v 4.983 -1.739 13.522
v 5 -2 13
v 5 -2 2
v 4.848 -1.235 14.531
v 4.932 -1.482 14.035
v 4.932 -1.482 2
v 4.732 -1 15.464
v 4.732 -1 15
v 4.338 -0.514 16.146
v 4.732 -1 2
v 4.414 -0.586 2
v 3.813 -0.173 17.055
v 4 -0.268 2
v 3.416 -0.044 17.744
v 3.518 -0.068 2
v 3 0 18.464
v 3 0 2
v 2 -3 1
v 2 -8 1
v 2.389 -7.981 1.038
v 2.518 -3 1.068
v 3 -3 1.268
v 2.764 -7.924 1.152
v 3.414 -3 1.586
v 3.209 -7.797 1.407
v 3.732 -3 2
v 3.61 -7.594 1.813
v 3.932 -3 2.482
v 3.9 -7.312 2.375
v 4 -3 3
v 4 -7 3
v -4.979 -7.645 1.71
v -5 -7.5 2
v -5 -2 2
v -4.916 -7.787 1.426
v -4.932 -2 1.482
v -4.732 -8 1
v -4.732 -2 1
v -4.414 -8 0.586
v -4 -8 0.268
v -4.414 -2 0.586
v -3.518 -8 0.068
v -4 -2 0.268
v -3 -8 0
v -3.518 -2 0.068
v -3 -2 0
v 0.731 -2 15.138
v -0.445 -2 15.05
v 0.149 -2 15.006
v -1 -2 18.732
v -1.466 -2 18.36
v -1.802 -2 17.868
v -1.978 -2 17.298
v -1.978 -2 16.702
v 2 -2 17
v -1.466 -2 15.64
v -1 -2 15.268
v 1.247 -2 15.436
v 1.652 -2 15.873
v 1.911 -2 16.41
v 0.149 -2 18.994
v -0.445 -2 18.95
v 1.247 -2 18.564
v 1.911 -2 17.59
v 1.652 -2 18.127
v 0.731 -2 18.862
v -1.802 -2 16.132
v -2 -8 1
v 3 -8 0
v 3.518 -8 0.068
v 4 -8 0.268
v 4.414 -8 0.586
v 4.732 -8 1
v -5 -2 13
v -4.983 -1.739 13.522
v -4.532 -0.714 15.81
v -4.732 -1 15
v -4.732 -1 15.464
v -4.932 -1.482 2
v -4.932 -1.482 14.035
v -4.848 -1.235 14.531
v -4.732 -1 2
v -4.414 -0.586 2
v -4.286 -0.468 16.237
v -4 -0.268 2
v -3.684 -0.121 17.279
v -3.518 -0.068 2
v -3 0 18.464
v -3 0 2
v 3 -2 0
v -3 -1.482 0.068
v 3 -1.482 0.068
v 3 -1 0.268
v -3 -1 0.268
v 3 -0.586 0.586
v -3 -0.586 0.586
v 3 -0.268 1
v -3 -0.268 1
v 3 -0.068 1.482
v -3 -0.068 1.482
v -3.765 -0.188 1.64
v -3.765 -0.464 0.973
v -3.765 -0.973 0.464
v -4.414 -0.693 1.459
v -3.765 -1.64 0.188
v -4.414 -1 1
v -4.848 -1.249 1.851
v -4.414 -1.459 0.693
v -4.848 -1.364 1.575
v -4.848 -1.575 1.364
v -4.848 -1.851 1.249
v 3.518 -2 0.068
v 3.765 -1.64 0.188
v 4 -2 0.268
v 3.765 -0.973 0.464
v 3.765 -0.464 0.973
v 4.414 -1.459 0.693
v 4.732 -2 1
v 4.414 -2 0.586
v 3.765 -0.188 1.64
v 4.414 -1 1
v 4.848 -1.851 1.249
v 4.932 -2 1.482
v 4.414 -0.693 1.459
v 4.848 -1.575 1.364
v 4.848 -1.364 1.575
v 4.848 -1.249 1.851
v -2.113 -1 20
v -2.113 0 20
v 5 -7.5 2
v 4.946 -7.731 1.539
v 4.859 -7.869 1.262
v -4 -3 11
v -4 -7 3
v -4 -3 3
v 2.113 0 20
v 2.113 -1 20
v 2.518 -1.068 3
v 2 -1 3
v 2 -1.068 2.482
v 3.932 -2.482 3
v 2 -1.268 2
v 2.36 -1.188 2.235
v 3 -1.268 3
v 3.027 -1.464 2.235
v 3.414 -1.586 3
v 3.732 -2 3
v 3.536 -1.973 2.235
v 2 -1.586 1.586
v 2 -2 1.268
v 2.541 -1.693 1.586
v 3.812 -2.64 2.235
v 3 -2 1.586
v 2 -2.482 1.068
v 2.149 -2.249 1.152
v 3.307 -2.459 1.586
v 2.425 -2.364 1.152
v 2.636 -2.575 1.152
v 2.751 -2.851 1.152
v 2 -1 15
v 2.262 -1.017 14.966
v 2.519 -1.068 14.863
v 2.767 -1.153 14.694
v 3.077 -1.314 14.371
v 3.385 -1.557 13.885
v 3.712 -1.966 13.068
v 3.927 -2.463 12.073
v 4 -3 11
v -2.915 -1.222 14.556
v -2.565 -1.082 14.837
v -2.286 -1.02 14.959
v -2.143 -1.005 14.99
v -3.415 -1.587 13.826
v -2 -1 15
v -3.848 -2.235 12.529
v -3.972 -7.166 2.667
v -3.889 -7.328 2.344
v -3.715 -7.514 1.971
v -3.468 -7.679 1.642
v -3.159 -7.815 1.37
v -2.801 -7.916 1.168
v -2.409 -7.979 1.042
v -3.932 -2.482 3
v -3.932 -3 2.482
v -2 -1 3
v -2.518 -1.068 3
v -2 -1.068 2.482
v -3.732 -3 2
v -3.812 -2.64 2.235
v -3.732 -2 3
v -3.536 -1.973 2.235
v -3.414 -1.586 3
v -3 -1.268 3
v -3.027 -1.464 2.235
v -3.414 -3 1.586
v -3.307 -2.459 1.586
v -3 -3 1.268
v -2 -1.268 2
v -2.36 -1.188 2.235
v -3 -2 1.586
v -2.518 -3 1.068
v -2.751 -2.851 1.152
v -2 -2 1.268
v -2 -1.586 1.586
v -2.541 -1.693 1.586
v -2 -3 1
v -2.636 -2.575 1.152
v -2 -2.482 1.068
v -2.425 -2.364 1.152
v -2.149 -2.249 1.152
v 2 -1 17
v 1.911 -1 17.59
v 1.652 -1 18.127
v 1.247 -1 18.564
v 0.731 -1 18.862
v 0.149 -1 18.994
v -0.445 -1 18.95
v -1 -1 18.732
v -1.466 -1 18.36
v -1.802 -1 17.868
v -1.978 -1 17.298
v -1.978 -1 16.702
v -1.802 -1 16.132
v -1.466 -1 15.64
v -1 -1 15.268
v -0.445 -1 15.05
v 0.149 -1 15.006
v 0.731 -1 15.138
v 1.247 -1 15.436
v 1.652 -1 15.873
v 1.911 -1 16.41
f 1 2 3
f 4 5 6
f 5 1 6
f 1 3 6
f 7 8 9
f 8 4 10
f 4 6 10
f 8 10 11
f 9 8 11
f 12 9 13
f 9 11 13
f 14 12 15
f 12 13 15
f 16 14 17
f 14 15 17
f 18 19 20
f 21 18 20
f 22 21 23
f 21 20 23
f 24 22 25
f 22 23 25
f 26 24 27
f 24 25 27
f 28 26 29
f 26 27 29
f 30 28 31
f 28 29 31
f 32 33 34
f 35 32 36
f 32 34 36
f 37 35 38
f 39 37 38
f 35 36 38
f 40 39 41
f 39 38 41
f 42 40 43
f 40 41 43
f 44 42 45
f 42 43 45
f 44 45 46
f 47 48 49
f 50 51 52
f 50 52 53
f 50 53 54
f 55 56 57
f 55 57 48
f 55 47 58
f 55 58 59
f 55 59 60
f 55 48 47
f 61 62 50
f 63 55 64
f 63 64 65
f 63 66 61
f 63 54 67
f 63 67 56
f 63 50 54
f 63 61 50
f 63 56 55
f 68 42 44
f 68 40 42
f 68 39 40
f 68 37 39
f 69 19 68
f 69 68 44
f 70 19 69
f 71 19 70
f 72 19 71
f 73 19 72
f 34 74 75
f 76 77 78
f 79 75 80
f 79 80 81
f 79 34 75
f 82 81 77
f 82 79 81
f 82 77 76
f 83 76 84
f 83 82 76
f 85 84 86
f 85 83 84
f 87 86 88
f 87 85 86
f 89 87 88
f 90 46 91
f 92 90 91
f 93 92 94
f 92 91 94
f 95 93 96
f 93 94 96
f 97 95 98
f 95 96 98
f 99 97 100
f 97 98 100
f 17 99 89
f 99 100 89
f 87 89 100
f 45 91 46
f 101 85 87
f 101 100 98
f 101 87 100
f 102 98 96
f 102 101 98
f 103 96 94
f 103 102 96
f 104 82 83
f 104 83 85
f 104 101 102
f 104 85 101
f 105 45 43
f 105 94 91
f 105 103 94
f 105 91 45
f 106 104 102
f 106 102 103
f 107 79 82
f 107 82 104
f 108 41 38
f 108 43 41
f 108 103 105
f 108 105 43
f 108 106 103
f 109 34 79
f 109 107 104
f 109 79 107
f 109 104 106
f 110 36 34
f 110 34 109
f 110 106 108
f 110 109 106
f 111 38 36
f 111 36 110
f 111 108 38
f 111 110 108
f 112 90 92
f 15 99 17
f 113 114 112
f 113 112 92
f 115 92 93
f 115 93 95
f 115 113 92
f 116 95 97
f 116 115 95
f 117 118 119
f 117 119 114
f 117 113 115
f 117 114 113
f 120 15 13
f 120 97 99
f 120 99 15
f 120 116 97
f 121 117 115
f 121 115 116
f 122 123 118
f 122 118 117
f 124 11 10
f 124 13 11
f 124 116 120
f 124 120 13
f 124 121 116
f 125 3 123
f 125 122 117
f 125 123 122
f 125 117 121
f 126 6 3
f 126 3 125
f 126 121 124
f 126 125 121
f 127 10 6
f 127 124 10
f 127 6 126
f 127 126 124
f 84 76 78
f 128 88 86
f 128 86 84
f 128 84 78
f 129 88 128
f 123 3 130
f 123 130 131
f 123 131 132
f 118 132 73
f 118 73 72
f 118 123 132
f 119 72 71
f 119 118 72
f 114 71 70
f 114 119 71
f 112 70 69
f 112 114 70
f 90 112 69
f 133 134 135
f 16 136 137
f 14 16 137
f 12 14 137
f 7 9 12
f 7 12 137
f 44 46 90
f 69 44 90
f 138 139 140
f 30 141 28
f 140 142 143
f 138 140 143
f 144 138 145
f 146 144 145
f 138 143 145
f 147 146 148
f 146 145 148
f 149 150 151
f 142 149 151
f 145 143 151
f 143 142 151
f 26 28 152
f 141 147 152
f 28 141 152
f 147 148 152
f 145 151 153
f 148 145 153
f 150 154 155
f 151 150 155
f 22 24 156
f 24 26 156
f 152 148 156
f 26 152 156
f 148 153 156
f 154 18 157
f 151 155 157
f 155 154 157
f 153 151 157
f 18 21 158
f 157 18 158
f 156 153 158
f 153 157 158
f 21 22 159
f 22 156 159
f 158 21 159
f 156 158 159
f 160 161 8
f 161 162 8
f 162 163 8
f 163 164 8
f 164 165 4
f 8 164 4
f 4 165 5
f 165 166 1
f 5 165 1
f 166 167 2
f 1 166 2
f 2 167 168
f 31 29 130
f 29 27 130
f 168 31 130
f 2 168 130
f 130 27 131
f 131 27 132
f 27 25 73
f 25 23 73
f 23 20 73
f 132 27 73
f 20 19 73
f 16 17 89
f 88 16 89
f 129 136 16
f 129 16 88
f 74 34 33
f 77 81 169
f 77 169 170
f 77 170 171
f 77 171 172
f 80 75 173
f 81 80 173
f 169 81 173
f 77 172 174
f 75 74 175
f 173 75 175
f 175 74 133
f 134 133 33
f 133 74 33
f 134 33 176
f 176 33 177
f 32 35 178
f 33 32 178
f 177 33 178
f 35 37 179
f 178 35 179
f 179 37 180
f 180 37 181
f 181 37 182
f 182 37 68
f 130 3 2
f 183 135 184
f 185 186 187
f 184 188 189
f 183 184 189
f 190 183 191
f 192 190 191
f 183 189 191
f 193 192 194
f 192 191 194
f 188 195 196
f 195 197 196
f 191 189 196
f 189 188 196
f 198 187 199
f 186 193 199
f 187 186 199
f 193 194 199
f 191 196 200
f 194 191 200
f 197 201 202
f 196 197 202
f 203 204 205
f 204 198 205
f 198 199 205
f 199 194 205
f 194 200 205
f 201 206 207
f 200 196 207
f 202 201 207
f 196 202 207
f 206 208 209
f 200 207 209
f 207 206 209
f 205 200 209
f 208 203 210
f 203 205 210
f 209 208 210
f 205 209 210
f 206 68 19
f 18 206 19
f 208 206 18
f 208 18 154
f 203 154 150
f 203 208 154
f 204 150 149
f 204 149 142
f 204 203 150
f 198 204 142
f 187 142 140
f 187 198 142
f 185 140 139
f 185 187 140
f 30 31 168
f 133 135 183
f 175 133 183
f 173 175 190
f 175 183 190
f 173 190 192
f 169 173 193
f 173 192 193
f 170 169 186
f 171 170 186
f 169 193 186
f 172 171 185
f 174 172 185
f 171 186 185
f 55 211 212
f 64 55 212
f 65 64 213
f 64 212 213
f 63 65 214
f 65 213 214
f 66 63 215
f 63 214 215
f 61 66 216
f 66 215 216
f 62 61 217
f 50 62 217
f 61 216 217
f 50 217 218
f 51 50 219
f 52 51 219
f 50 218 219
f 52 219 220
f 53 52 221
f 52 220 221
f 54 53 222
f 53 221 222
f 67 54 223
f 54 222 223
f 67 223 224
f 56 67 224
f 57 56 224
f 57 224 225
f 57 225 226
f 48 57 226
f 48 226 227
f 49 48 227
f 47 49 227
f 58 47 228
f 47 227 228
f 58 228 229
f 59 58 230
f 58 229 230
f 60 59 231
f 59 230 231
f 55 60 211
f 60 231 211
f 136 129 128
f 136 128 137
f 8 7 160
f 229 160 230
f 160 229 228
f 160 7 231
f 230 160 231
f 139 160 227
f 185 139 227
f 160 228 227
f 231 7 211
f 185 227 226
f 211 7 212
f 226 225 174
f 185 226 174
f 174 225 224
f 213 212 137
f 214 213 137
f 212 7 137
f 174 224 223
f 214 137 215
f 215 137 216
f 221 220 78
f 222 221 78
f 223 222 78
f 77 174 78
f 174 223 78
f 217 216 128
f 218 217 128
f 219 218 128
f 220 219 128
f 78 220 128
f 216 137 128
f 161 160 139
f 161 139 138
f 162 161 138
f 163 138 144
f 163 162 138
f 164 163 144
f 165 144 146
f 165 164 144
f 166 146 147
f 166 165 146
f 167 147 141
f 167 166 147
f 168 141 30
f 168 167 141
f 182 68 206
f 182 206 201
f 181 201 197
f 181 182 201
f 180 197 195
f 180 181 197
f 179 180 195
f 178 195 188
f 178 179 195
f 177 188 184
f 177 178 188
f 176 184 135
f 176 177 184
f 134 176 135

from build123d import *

# Parameters (mm, degrees)
F0_W          = 10
F0_H          = 15
F1_DEPTH      = 8
F2_W          = 8
F2_H          = 14
F3_DEPTH      = 14
F5_DEPTH      = 25
F7_DEPTH      = 1
F8_R          = 2
F9_DEPTH      = 1
F10_T1_DEPTH  = 4
F10_S5_W      = 2.04
F10_S5_H      = 2.04
F10_T6_DEPTH  = 2.04
F10_S11_W     = 2.04
F10_S11_H     = 2.04
F10_T12_DEPTH = 2.04
F10_T18_DEPTH = 10
F10_T23_DEPTH = 10
F10_T28_DEPTH = 17
F10_T33_DEPTH = 17
F10_T35_DEPTH = 6
F10_T37_DEPTH = 18
F10_T39_DEPTH = 11
F10_S43_W     = 2.04
F10_S43_H     = 2.04
F10_T44_DEPTH = 2.04
F10_S49_W     = 2.04
F10_S49_H     = 2.04
F10_T50_DEPTH = 2.04


# Not quite as in the source:
# - a fillet or chamfer that OpenCascade refuses, or shapes differently, is made with other operations: its cross-section is extruded or revolved along the edge and cut away or added


with BuildPart() as f1:
    # F0 (on Front) → F1 (new body)
    with BuildSketch(Plane.XZ):
        with Locations((0, 7.5)):
            Rectangle(F0_W, F0_H)
    extrude(amount=F1_DEPTH)

    # F2 (on face) → F3 (cut)
    with BuildSketch(Plane.XZ.offset(8)):
        with Locations((0, 8)):
            Rectangle(F2_W, F2_H)
    extrude(amount=-F3_DEPTH, mode=Mode.SUBTRACT)

    # F4 (on face) → F5 (cut)
    with BuildSketch(Plane(origin=(-5, 0, 0), x_dir=(0, -1, 0), z_dir=(-1, 0, 0))):
        Polygon((8, 15), (1, 15), (8, 1), align=None)
    extrude(amount=-F5_DEPTH, mode=Mode.SUBTRACT)

    # F6 (on face) → F7 (join)
    with BuildSketch(Plane(origin=(0, 0, 0), x_dir=(-1, 0, 0), z_dir=(0, 1, 0))):
        Polygon((4, 15), (5, 15), (2.1132486541, 20), (-2.1132486541, 20), (-5, 15), (-4, 15), (-4, 1), (4, 1), align=None)
    extrude(amount=-F7_DEPTH)

    # F8 (on face) → F9 (join)
    with BuildSketch(Plane.XZ.offset(1)):
        with Locations((0, 17)):
            Circle(F8_R)
    extrude(amount=F9_DEPTH)

    # F10: fillet of radius 2 on 12 edges, made by hand

    # F10_s2 → F10_t1 (join)
    with BuildSketch(Plane.YZ.offset(-2)):
        with BuildLine():
            ThreePointArc((-3, 1), (-1.5857864376, 1.5857864376), (-1, 3))
            Line((-1, 3), (-1, 1))
            Line((-1, 1), (-3, 1))
        make_face()
    extrude(amount=F10_T1_DEPTH)


with BuildPart() as f10_tool4:
    # F10_s5 → F10_t6 (new body)
    with BuildSketch(Plane.XY.offset(3)):
        with Locations((-3.02, -1.98)):
            Rectangle(F10_S5_W, F10_S5_H)
    extrude(amount=-F10_T6_DEPTH)

    # F10_s7 → F10_t8 (revolve, cut)
    with BuildSketch(Plane(origin=(-2, -3, 3), x_dir=(0.7071067812, -0.7071067812, 0), z_dir=(0.7071067812, 0.7071067812, 0))):
        with BuildLine():
            ThreePointArc((0, -2), (2, 0), (0, 2))
            Line((0, 2), (0, -2))
        make_face()
    revolve(axis=Axis((-2, -3, 3), (0, 0, -1)), mode=Mode.SUBTRACT)


with BuildPart() as f1_1:
    add(f1.part)

    # F10_t3: union F10_tool4
    add(f10_tool4.part)


with BuildPart() as f10_tool10:
    # F10_s11 → F10_t12 (new body)
    with BuildSketch(Plane.XY.offset(3)):
        with Locations((3.02, -1.98)):
            Rectangle(F10_S11_W, F10_S11_H)
    extrude(amount=-F10_T12_DEPTH)

    # F10_s13 → F10_t14 (revolve, cut)
    with BuildSketch(Plane(origin=(2, -3, 3), x_dir=(-0.7071067812, -0.7071067812, 0), z_dir=(0.7071067812, -0.7071067812, 0))):
        with BuildLine():
            ThreePointArc((0, -2), (2, 0), (0, 2))
            Line((0, 2), (0, -2))
        make_face()
    revolve(axis=Axis((2, -3, 3), (0, 0, -1)), mode=Mode.SUBTRACT)


with BuildPart() as f1_2:
    add(f1_1.part)

    # F10_t9: union F10_tool10
    add(f10_tool10.part)


with BuildPart() as f10_tool16:
    # F10_s17 → F10_t18 (new body)
    with BuildSketch(Plane.XZ.offset(13)):
        with BuildLine():
            ThreePointArc((-2, 1), (-3.4142135624, 1.5857864376), (-4, 3))
            Line((-4, 3), (-4, 1))
            Line((-4, 1), (-2, 1))
        make_face()
    extrude(amount=-F10_T18_DEPTH)

    split(bisect_by=Plane(origin=(0, -6.8, 3.4), x_dir=(1, 0, 0), z_dir=(0, 0.894427191, -0.4472135955)), keep=Keep.TOP)


with BuildPart() as f1_3:
    add(f1_2.part)

    # F10_t15: union F10_tool16
    add(f10_tool16.part)


with BuildPart() as f10_tool21:
    # F10_s22 → F10_t23 (new body)
    with BuildSketch(Plane.XZ.offset(13)):
        with BuildLine():
            ThreePointArc((2, 1), (3.4142135624, 1.5857864376), (4, 3))
            Line((4, 3), (4, 1))
            Line((4, 1), (2, 1))
        make_face()
    extrude(amount=-F10_T23_DEPTH)

    split(bisect_by=Plane(origin=(0, -6.8, 3.4), x_dir=(1, 0, 0), z_dir=(0, 0.894427191, -0.4472135955)), keep=Keep.TOP)


with BuildPart() as f1_4:
    add(f1_3.part)

    # F10_t20: union F10_tool21
    add(f10_tool21.part)


with BuildPart() as f10_tool26:
    # F10_s27 → F10_t28 (new body)
    with BuildSketch(Plane.XY.offset(20)):
        with BuildLine():
            ThreePointArc((2, -1), (3.4142135624, -1.5857864376), (4, -3))
            Line((4, -3), (4, -1))
            Line((4, -1), (2, -1))
        make_face()
    extrude(amount=-F10_T28_DEPTH)

    split(bisect_by=Plane(origin=(0, -6.8, 3.4), x_dir=(1, 0, 0), z_dir=(0, 0.894427191, -0.4472135955)), keep=Keep.TOP)


with BuildPart() as f1_5:
    add(f1_4.part)

    # F10_t25: union F10_tool26
    add(f10_tool26.part)


with BuildPart() as f10_tool31:
    # F10_s32 → F10_t33 (new body)
    with BuildSketch(Plane.XY.offset(3)):
        with BuildLine():
            ThreePointArc((-4, -3), (-3.4142135624, -1.5857864376), (-2, -1))
            Line((-2, -1), (-4, -1))
            Line((-4, -1), (-4, -3))
        make_face()
    extrude(amount=F10_T33_DEPTH)

    split(bisect_by=Plane(origin=(0, -6.8, 3.4), x_dir=(1, 0, 0), z_dir=(0, 0.894427191, -0.4472135955)), keep=Keep.TOP)


with BuildPart() as f1_6:
    add(f1_5.part)

    # F10_t30: union F10_tool31
    add(f10_tool31.part)

    # F10_s36 → F10_t35 (cut)
    with BuildSketch(Plane.YZ.offset(-3)):
        with BuildLine():
            ThreePointArc((-2, 0), (-0.5857864376, 0.5857864376), (0, 2))
            Line((0, 2), (0, 0))
            Line((0, 0), (-2, 0))
        make_face()
    extrude(amount=F10_T35_DEPTH, mode=Mode.SUBTRACT)

    # F10_s38 → F10_t37 (cut)
    with BuildSketch(Plane.XY.offset(2)):
        with BuildLine():
            ThreePointArc((-5, -2), (-4.4142135624, -0.5857864376), (-3, 0))
            Line((-3, 0), (-5, 0))
            Line((-5, 0), (-5, -2))
        make_face()
        with BuildLine():
            ThreePointArc((5, -2), (4.4142135624, -0.5857864376), (3, 0))
            Line((3, 0), (5, 0))
            Line((5, 0), (5, -2))
        make_face()
    extrude(amount=F10_T37_DEPTH, mode=Mode.SUBTRACT)

    # F10_s40 → F10_t39 (cut)
    with BuildSketch(Plane.XZ.offset(2)):
        with BuildLine():
            ThreePointArc((-5, 2), (-4.4142135624, 0.5857864376), (-3, 0))
            Line((-3, 0), (-5, 0))
            Line((-5, 0), (-5, 2))
        make_face()
        with BuildLine():
            ThreePointArc((5, 2), (4.4142135624, 0.5857864376), (3, 0))
            Line((3, 0), (5, 0))
            Line((5, 0), (5, 2))
        make_face()
    extrude(amount=F10_T39_DEPTH, mode=Mode.SUBTRACT)


with BuildPart() as f10_tool42:
    # F10_s43 → F10_t44 (new body)
    with BuildSketch(Plane.YZ.offset(-3)):
        with Locations((-0.98, 0.98)):
            Rectangle(F10_S43_W, F10_S43_H)
    extrude(amount=-F10_T44_DEPTH)

    # F10_s45 → F10_t46 (revolve, cut)
    with BuildSketch(Plane(origin=(-3, -2, 2), x_dir=(0, -0.7071067812, 0.7071067812), z_dir=(0, -0.7071067812, -0.7071067812))):
        with BuildLine():
            ThreePointArc((0, -2), (2, 0), (0, 2))
            Line((0, 2), (0, -2))
        make_face()
    revolve(axis=Axis((-3, -2, 2), (-1, 0, 0)), mode=Mode.SUBTRACT)


with BuildPart() as f1_7:
    add(f1_6.part)

    # F10_t41: cut F10_tool42
    add(f10_tool42.part, mode=Mode.SUBTRACT)


with BuildPart() as f10_tool48:
    # F10_s49 → F10_t50 (new body)
    with BuildSketch(Plane.YZ.offset(3)):
        with Locations((-0.98, 0.98)):
            Rectangle(F10_S49_W, F10_S49_H)
    extrude(amount=F10_T50_DEPTH)

    # F10_s51 → F10_t52 (revolve, cut)
    with BuildSketch(Plane(origin=(3, -2, 2), x_dir=(0, -0.7071067812, 0.7071067812), z_dir=(0, 0.7071067812, 0.7071067812))):
        with BuildLine():
            ThreePointArc((0, -2), (2, 0), (0, 2))
            Line((0, 2), (0, -2))
        make_face()
    revolve(axis=Axis((3, -2, 2), (1, 0, 0)), mode=Mode.SUBTRACT)


with BuildPart() as f1_8:
    add(f1_7.part)

    # F10_t47: cut F10_tool48
    add(f10_tool48.part, mode=Mode.SUBTRACT)


solid = f1_8.part
